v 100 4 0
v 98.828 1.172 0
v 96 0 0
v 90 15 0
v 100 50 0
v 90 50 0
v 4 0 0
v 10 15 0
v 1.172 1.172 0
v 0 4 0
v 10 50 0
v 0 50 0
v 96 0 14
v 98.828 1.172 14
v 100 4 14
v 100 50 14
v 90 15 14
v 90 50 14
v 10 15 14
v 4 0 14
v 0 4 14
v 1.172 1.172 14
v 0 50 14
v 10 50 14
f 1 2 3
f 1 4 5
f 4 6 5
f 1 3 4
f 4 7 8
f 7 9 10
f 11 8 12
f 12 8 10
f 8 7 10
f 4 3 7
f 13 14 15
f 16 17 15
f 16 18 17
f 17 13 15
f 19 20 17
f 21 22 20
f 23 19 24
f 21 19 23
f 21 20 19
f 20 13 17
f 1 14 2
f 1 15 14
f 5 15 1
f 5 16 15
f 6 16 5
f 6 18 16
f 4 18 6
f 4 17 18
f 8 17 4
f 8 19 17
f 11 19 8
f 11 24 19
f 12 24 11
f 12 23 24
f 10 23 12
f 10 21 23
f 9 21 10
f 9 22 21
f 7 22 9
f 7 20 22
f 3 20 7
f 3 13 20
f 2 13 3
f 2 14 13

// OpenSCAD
$fn = 32;

// ----------------------------------------------------------------------
// Heat sink frame: 100 x 50 mm frame, 10 mm walls
// ----------------------------------------------------------------------

// --- parameters (mm) ---
profile_height = 14;      // extrusion height
profile_points = 12;      // points of the closed outline

profile = [[0, 4], [1.172, 1.172], [4, 0], [96, 0], [98.828, 1.172], [100, 4], [100, 50], [90, 50], [90, 15], [10, 15], [10, 50], [0, 50]];  // single closed polygon, 12 points, counter clockwise

// --- the one profile operation ---
linear_extrude(height = profile_height) polygon(points = profile);
